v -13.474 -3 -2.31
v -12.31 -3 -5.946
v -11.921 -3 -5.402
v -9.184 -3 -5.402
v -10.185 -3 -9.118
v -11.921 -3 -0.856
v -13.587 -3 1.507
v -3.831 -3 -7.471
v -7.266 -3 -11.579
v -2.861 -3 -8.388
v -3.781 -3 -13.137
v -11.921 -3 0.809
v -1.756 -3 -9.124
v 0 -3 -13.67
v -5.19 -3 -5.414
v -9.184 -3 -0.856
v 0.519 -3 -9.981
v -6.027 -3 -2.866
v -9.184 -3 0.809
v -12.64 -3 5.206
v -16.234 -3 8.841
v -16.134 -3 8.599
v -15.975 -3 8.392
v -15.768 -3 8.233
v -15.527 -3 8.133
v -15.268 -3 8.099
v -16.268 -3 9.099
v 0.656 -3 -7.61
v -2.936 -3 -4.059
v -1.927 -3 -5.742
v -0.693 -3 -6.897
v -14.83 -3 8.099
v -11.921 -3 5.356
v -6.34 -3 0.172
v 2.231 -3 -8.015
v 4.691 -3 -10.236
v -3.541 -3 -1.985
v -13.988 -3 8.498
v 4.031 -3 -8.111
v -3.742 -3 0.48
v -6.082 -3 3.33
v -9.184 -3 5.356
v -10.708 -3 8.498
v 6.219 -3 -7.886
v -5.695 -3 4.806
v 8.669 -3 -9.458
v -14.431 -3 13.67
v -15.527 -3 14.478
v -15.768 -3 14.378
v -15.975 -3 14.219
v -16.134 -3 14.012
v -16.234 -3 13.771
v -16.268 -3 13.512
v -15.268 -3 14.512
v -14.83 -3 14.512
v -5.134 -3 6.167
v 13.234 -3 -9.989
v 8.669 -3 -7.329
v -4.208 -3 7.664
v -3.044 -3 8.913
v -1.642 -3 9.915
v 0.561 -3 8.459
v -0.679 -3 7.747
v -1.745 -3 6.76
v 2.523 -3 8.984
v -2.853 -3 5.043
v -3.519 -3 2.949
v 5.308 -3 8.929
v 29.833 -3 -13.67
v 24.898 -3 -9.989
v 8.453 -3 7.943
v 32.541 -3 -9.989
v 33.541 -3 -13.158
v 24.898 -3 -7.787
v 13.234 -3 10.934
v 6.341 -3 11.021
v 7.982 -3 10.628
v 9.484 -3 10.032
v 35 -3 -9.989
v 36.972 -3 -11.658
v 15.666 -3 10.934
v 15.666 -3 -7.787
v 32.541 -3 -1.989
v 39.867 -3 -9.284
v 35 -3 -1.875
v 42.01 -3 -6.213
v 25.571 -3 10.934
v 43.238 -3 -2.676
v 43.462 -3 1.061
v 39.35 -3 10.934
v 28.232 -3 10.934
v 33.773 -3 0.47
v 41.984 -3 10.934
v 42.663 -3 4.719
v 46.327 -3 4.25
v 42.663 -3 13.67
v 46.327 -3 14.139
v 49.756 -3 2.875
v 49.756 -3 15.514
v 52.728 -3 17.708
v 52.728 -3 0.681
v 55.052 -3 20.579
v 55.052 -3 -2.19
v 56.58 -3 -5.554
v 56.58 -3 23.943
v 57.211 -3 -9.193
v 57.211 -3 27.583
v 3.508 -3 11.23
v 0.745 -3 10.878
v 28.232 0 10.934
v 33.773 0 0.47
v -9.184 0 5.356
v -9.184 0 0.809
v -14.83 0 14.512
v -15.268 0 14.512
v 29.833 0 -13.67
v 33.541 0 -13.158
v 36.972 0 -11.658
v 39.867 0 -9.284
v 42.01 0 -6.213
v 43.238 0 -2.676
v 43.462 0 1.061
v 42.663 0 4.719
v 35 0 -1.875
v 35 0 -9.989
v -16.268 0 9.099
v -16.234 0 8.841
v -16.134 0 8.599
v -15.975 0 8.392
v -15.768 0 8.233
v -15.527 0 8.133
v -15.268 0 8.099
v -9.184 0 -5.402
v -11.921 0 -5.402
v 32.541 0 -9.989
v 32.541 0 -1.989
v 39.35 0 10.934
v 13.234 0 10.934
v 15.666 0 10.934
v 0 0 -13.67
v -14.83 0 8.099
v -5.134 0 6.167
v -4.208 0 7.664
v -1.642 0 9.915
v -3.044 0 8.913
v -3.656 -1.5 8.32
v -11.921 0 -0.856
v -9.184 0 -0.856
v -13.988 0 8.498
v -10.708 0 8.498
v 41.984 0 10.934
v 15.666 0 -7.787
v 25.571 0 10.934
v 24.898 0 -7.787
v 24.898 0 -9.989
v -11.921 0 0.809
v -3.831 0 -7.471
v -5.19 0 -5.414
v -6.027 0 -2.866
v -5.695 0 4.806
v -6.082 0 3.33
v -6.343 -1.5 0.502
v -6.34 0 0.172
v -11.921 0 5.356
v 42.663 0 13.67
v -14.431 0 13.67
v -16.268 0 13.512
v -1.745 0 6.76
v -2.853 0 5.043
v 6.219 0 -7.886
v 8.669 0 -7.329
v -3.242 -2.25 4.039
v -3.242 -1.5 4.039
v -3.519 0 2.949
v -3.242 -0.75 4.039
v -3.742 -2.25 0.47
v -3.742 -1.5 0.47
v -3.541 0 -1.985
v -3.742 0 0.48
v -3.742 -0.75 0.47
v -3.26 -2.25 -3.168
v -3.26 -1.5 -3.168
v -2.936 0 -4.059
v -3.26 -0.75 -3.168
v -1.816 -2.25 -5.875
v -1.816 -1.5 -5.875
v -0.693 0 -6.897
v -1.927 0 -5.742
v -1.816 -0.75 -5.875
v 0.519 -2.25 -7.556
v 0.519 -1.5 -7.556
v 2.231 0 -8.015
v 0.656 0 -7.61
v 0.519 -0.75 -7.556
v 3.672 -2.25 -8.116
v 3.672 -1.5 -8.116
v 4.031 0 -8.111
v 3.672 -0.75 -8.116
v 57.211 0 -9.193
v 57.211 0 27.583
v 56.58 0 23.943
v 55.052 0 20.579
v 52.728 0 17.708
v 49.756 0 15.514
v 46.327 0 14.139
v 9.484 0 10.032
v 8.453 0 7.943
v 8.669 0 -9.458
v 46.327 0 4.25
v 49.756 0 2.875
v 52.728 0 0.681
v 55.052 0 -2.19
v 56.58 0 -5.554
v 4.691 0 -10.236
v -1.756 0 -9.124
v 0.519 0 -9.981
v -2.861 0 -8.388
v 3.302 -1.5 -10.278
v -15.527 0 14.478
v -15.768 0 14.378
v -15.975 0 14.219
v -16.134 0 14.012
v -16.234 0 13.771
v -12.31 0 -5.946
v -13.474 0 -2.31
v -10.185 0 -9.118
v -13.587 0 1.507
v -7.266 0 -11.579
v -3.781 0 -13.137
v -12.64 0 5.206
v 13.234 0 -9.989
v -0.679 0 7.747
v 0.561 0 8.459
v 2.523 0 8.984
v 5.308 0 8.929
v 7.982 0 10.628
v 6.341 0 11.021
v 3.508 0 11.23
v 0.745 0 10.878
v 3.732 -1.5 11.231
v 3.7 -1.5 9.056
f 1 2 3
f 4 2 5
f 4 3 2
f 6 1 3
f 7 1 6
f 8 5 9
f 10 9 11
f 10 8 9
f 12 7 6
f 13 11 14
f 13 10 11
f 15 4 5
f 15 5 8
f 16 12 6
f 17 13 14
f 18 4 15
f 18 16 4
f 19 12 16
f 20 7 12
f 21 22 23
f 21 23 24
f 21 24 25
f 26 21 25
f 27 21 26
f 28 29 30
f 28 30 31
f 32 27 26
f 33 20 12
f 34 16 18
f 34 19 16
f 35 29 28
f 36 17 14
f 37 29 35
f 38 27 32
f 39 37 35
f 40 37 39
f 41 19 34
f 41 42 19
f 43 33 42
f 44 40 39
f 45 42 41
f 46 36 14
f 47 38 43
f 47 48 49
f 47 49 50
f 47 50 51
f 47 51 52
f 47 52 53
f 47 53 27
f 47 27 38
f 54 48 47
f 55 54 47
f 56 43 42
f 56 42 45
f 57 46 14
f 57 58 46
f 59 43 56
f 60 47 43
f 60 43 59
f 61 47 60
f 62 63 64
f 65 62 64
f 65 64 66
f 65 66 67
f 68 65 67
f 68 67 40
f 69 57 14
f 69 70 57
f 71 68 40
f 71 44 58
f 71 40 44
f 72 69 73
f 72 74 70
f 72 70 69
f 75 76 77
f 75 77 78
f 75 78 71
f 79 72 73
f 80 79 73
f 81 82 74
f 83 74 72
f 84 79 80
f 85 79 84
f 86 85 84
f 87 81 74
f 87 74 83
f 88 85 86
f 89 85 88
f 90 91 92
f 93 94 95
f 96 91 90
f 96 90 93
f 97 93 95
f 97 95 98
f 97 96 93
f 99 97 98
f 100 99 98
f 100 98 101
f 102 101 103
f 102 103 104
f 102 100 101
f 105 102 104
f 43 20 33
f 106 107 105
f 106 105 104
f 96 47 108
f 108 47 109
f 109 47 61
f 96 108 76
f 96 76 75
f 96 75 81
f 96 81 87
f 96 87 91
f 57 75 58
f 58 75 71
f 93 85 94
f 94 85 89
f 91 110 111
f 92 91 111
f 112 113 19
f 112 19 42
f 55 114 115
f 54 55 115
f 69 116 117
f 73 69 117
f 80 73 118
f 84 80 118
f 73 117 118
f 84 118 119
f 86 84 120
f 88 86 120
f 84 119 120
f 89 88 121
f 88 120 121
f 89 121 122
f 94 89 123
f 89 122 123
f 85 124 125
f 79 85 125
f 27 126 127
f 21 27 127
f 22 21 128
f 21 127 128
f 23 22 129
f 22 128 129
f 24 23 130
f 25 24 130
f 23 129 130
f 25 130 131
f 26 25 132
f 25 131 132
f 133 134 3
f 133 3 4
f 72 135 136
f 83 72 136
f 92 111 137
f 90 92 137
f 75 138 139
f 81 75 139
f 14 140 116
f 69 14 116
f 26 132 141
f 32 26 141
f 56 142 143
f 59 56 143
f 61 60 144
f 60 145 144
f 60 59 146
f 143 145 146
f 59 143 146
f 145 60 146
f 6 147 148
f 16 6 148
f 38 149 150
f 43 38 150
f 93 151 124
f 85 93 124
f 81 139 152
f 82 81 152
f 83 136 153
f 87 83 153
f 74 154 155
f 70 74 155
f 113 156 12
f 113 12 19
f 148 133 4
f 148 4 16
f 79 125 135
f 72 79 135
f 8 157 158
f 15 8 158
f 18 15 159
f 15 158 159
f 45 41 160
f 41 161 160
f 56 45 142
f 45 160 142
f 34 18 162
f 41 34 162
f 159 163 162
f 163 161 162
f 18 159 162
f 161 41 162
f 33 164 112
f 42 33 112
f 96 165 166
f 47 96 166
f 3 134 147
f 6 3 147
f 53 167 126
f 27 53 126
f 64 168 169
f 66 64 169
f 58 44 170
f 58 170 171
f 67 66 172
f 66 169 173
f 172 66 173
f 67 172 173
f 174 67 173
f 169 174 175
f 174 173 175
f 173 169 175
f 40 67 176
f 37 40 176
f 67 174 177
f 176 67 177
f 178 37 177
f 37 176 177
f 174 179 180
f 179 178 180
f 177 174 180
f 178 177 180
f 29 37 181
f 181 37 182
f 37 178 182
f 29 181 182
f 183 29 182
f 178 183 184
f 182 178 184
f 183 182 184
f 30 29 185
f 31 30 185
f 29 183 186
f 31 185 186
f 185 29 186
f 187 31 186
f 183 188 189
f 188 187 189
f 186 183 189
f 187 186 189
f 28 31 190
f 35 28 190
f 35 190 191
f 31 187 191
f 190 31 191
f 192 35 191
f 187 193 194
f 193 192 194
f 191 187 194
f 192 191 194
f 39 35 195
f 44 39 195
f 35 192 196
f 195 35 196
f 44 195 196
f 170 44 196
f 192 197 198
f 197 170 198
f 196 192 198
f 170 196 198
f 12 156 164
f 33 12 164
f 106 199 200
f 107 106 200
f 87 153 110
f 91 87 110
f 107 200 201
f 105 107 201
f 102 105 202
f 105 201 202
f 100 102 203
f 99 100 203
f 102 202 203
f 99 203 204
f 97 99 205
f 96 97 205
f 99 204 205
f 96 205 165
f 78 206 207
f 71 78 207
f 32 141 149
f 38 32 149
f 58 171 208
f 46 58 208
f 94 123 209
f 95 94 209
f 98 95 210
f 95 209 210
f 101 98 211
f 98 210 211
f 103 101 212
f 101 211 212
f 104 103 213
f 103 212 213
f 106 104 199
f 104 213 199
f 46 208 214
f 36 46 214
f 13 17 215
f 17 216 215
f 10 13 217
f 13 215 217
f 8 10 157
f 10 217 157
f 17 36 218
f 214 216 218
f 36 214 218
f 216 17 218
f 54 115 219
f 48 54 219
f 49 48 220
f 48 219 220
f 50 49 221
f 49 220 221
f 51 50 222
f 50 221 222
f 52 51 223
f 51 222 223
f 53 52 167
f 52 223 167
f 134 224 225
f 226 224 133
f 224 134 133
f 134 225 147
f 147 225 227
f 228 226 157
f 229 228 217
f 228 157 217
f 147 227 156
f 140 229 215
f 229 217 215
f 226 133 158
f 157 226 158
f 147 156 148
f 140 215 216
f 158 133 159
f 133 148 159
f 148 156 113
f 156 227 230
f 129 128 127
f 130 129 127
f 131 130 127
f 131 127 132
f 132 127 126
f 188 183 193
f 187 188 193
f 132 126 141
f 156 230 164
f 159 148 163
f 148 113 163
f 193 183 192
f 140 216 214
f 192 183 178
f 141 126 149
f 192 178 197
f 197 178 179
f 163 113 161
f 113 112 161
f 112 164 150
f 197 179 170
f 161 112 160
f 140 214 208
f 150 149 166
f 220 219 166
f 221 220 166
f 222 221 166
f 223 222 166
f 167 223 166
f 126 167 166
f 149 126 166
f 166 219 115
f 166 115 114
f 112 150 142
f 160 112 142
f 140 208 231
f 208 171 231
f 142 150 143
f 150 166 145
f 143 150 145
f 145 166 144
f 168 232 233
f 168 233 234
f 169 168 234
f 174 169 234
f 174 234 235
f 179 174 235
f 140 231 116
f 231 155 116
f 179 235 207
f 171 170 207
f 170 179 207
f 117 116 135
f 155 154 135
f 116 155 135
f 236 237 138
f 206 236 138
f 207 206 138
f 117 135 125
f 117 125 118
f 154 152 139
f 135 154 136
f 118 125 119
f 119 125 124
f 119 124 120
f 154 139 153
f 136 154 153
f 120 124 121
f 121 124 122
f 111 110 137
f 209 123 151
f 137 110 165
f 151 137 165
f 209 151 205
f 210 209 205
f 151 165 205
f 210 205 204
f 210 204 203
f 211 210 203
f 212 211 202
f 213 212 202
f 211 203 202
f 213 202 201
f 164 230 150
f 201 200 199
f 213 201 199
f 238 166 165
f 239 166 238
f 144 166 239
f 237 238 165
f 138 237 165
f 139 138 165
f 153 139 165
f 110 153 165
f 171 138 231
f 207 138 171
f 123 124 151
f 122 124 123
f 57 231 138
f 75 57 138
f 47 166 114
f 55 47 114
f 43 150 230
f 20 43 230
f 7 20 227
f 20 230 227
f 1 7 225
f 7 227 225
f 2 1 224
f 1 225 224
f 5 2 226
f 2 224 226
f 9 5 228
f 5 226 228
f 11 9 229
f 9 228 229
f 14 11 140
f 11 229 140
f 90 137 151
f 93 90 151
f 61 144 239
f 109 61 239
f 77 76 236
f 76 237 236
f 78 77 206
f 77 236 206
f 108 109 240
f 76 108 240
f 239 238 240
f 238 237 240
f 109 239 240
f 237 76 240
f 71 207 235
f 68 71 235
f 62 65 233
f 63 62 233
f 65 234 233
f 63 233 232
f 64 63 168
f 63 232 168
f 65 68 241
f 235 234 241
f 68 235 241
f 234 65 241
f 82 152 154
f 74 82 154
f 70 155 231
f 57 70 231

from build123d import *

# Parameters (mm, degrees)
F0_W     = 2.7374038473
F0_H     = 4.5464726281
F1_DEPTH = 3


with BuildPart() as f1:
    # F0 (on Front) → F1 (new body)
    with BuildSketch(Plane.XZ):
        with BuildLine():
            Line((-13.9879264009, 8.4983842463), (-10.7078288449, 8.4983842463))
            ThreePointArc((-10.7078288449, 8.4983842463), (-12.3096819162, -5.9457433928), (0, -13.6704108706))
            Line((0, -13.6704108706), (29.832560569, -13.6704108706))
            ThreePointArc((29.832560569, -13.6704108706), (41.0439649972, -7.8220549805), (42.6626390029, 4.7190275219))
            ThreePointArc((42.6626390029, 4.7190275219), (52.7277631814, 0.6811115523), (57.2114773095, -9.193492122))
            Line((57.2114773095, -9.193492122), (57.2114773095, 27.5829305145))
            ThreePointArc((57.2114773095, 27.5829305145), (52.7277631814, 17.7083268402), (42.6626390029, 13.6704108706))
            Line((42.6626390029, 13.6704108706), (29.832560569, 13.6704108706))
            Line((29.832560569, 13.6704108706), (0, 13.6704108706))
            Line((0, 13.6704108706), (-14.4307379611, 13.6704108706))
            Line((-14.4307379611, 13.6704108706), (-14.8297163701, 14.5122008398))
            Line((-14.8297163701, 14.5122008398), (-15.268201828, 14.5122008398))
            ThreePointArc((-15.268201828, 14.5122008398), (-15.9753086092, 14.219307621), (-16.268201828, 13.5122008398))
            Line((-16.268201828, 13.5122008398), (-16.268201828, 9.0994058373))
            ThreePointArc((-16.268201828, 9.0994058373), (-15.9753086092, 8.3922990562), (-15.268201828, 8.0994058373))
            Line((-15.268201828, 8.0994058373), (-14.8297163701, 8.0994058373))
            Line((-14.8297163701, 8.0994058373), (-13.9879264009, 8.4983842463))
        make_face()
        with Locations((-10.5523099191, -3.12910098)):
            Rectangle(F0_W, F0_H, mode=Mode.SUBTRACT)
        with BuildLine():
            add(Edge.make_bspline(
                [(8.4533115607, 7.9434605246), (6.0766133419, 9.056249864), (3.699915123, 9.056249864)],
                knots=[0, 0, 0, 1, 1, 1], degree=2))
            add(Edge.make_bspline(
                [(3.699915123, 9.056249864), (0.2516419847, 9.056249864), (-1.7449676943, 6.7596907952)],
                knots=[0, 0, 0, 1, 1, 1], degree=2))
            add(Edge.make_bspline(
                [(-1.7449676943, 6.7596907952), (-3.7415773734, 4.4631317263), (-3.7415773734, 0.4699123682)],
                knots=[0, 0, 0, 1, 1, 1], degree=2))
            add(Edge.make_bspline(
                [(-3.7415773734, 0.4699123682), (-3.7415773734, -3.6332121098), (-1.8159480843, -5.8748186187)],
                knots=[0, 0, 0, 1, 1, 1], degree=2))
            add(Edge.make_bspline(
                [(-1.8159480843, -5.8748186187), (0.1096812048, -8.1164251276), (3.672438843, -8.1164251276)],
                knots=[0, 0, 0, 1, 1, 1], degree=2))
            add(Edge.make_bspline(
                [(3.672438843, -8.1164251276), (5.861382482, -8.1164251276), (8.6685424206, -7.328771768)],
                knots=[0, 0, 0, 1, 1, 1], degree=2))
            Line((8.6685424206, -7.328771768), (8.6685424206, -9.458183467))
            add(Edge.make_bspline(
                [(8.6685424206, -9.458183467), (6.4933369217, -10.2778924866), (3.3015090632, -10.2778924866)],
                knots=[0, 0, 0, 1, 1, 1], degree=2))
            add(Edge.make_bspline(
                [(3.3015090632, -10.2778924866), (-1.3190853545, -10.2778924866), (-3.8308752833, -7.4707325479)],
                knots=[0, 0, 0, 1, 1, 1], degree=2))
            add(Edge.make_bspline(
                [(-3.8308752833, -7.4707325479), (-6.3426652121, -4.6635726093), (-6.3426652121, 0.5019680282)],
                knots=[0, 0, 0, 1, 1, 1], degree=2))
            add(Edge.make_bspline(
                [(-6.3426652121, 0.5019680282), (-6.3426652121, 3.7350103066), (-5.1337088927, 6.1666610854)],
                knots=[0, 0, 0, 1, 1, 1], degree=2))
            add(Edge.make_bspline(
                [(-5.1337088927, 6.1666610854), (-3.9247525733, 8.5983118643), (-1.6419316444, 9.9148836136)],
                knots=[0, 0, 0, 1, 1, 1], degree=2))
            add(Edge.make_bspline(
                [(-1.6419316444, 9.9148836136), (0.6408892845, 11.231455363), (3.731970783, 11.231455363)],
                knots=[0, 0, 0, 1, 1, 1], degree=2))
            add(Edge.make_bspline(
                [(3.731970783, 11.231455363), (7.0199656214, 11.231455363), (9.4836720602, 10.0316578036)],
                knots=[0, 0, 0, 1, 1, 1], degree=2))
            Line((9.4836720602, 10.0316578036), (8.4533115607, 7.9434605246))
        make_face(mode=Mode.SUBTRACT)
        with Locations((-10.5523099191, 3.0826488801)):
            Rectangle(F0_W, F0_H, mode=Mode.SUBTRACT)
        Polygon((24.8978651327, -9.9893915467), (13.2341842784, -9.9893915467), (13.2341842784, 10.9337956631), (15.6658350572, 10.9337956631), (15.6658350572, -7.7867097678), (24.8978651327, -7.7867097678), align=None, mode=Mode.SUBTRACT)
        Polygon((28.2316537711, 10.9337956631), (33.7727035684, 0.4699123682), (39.3503884057, 10.9337956631), (41.9835319044, 10.9337956631), (34.9999774078, -1.8747301906), (34.9999774078, -9.9893915467), (32.540850349, -9.9893915467), (32.540850349, -1.9892146906), (25.5710339924, 10.9337956631), align=None, mode=Mode.SUBTRACT)
    extrude(amount=F1_DEPTH)


solid = f1.part
